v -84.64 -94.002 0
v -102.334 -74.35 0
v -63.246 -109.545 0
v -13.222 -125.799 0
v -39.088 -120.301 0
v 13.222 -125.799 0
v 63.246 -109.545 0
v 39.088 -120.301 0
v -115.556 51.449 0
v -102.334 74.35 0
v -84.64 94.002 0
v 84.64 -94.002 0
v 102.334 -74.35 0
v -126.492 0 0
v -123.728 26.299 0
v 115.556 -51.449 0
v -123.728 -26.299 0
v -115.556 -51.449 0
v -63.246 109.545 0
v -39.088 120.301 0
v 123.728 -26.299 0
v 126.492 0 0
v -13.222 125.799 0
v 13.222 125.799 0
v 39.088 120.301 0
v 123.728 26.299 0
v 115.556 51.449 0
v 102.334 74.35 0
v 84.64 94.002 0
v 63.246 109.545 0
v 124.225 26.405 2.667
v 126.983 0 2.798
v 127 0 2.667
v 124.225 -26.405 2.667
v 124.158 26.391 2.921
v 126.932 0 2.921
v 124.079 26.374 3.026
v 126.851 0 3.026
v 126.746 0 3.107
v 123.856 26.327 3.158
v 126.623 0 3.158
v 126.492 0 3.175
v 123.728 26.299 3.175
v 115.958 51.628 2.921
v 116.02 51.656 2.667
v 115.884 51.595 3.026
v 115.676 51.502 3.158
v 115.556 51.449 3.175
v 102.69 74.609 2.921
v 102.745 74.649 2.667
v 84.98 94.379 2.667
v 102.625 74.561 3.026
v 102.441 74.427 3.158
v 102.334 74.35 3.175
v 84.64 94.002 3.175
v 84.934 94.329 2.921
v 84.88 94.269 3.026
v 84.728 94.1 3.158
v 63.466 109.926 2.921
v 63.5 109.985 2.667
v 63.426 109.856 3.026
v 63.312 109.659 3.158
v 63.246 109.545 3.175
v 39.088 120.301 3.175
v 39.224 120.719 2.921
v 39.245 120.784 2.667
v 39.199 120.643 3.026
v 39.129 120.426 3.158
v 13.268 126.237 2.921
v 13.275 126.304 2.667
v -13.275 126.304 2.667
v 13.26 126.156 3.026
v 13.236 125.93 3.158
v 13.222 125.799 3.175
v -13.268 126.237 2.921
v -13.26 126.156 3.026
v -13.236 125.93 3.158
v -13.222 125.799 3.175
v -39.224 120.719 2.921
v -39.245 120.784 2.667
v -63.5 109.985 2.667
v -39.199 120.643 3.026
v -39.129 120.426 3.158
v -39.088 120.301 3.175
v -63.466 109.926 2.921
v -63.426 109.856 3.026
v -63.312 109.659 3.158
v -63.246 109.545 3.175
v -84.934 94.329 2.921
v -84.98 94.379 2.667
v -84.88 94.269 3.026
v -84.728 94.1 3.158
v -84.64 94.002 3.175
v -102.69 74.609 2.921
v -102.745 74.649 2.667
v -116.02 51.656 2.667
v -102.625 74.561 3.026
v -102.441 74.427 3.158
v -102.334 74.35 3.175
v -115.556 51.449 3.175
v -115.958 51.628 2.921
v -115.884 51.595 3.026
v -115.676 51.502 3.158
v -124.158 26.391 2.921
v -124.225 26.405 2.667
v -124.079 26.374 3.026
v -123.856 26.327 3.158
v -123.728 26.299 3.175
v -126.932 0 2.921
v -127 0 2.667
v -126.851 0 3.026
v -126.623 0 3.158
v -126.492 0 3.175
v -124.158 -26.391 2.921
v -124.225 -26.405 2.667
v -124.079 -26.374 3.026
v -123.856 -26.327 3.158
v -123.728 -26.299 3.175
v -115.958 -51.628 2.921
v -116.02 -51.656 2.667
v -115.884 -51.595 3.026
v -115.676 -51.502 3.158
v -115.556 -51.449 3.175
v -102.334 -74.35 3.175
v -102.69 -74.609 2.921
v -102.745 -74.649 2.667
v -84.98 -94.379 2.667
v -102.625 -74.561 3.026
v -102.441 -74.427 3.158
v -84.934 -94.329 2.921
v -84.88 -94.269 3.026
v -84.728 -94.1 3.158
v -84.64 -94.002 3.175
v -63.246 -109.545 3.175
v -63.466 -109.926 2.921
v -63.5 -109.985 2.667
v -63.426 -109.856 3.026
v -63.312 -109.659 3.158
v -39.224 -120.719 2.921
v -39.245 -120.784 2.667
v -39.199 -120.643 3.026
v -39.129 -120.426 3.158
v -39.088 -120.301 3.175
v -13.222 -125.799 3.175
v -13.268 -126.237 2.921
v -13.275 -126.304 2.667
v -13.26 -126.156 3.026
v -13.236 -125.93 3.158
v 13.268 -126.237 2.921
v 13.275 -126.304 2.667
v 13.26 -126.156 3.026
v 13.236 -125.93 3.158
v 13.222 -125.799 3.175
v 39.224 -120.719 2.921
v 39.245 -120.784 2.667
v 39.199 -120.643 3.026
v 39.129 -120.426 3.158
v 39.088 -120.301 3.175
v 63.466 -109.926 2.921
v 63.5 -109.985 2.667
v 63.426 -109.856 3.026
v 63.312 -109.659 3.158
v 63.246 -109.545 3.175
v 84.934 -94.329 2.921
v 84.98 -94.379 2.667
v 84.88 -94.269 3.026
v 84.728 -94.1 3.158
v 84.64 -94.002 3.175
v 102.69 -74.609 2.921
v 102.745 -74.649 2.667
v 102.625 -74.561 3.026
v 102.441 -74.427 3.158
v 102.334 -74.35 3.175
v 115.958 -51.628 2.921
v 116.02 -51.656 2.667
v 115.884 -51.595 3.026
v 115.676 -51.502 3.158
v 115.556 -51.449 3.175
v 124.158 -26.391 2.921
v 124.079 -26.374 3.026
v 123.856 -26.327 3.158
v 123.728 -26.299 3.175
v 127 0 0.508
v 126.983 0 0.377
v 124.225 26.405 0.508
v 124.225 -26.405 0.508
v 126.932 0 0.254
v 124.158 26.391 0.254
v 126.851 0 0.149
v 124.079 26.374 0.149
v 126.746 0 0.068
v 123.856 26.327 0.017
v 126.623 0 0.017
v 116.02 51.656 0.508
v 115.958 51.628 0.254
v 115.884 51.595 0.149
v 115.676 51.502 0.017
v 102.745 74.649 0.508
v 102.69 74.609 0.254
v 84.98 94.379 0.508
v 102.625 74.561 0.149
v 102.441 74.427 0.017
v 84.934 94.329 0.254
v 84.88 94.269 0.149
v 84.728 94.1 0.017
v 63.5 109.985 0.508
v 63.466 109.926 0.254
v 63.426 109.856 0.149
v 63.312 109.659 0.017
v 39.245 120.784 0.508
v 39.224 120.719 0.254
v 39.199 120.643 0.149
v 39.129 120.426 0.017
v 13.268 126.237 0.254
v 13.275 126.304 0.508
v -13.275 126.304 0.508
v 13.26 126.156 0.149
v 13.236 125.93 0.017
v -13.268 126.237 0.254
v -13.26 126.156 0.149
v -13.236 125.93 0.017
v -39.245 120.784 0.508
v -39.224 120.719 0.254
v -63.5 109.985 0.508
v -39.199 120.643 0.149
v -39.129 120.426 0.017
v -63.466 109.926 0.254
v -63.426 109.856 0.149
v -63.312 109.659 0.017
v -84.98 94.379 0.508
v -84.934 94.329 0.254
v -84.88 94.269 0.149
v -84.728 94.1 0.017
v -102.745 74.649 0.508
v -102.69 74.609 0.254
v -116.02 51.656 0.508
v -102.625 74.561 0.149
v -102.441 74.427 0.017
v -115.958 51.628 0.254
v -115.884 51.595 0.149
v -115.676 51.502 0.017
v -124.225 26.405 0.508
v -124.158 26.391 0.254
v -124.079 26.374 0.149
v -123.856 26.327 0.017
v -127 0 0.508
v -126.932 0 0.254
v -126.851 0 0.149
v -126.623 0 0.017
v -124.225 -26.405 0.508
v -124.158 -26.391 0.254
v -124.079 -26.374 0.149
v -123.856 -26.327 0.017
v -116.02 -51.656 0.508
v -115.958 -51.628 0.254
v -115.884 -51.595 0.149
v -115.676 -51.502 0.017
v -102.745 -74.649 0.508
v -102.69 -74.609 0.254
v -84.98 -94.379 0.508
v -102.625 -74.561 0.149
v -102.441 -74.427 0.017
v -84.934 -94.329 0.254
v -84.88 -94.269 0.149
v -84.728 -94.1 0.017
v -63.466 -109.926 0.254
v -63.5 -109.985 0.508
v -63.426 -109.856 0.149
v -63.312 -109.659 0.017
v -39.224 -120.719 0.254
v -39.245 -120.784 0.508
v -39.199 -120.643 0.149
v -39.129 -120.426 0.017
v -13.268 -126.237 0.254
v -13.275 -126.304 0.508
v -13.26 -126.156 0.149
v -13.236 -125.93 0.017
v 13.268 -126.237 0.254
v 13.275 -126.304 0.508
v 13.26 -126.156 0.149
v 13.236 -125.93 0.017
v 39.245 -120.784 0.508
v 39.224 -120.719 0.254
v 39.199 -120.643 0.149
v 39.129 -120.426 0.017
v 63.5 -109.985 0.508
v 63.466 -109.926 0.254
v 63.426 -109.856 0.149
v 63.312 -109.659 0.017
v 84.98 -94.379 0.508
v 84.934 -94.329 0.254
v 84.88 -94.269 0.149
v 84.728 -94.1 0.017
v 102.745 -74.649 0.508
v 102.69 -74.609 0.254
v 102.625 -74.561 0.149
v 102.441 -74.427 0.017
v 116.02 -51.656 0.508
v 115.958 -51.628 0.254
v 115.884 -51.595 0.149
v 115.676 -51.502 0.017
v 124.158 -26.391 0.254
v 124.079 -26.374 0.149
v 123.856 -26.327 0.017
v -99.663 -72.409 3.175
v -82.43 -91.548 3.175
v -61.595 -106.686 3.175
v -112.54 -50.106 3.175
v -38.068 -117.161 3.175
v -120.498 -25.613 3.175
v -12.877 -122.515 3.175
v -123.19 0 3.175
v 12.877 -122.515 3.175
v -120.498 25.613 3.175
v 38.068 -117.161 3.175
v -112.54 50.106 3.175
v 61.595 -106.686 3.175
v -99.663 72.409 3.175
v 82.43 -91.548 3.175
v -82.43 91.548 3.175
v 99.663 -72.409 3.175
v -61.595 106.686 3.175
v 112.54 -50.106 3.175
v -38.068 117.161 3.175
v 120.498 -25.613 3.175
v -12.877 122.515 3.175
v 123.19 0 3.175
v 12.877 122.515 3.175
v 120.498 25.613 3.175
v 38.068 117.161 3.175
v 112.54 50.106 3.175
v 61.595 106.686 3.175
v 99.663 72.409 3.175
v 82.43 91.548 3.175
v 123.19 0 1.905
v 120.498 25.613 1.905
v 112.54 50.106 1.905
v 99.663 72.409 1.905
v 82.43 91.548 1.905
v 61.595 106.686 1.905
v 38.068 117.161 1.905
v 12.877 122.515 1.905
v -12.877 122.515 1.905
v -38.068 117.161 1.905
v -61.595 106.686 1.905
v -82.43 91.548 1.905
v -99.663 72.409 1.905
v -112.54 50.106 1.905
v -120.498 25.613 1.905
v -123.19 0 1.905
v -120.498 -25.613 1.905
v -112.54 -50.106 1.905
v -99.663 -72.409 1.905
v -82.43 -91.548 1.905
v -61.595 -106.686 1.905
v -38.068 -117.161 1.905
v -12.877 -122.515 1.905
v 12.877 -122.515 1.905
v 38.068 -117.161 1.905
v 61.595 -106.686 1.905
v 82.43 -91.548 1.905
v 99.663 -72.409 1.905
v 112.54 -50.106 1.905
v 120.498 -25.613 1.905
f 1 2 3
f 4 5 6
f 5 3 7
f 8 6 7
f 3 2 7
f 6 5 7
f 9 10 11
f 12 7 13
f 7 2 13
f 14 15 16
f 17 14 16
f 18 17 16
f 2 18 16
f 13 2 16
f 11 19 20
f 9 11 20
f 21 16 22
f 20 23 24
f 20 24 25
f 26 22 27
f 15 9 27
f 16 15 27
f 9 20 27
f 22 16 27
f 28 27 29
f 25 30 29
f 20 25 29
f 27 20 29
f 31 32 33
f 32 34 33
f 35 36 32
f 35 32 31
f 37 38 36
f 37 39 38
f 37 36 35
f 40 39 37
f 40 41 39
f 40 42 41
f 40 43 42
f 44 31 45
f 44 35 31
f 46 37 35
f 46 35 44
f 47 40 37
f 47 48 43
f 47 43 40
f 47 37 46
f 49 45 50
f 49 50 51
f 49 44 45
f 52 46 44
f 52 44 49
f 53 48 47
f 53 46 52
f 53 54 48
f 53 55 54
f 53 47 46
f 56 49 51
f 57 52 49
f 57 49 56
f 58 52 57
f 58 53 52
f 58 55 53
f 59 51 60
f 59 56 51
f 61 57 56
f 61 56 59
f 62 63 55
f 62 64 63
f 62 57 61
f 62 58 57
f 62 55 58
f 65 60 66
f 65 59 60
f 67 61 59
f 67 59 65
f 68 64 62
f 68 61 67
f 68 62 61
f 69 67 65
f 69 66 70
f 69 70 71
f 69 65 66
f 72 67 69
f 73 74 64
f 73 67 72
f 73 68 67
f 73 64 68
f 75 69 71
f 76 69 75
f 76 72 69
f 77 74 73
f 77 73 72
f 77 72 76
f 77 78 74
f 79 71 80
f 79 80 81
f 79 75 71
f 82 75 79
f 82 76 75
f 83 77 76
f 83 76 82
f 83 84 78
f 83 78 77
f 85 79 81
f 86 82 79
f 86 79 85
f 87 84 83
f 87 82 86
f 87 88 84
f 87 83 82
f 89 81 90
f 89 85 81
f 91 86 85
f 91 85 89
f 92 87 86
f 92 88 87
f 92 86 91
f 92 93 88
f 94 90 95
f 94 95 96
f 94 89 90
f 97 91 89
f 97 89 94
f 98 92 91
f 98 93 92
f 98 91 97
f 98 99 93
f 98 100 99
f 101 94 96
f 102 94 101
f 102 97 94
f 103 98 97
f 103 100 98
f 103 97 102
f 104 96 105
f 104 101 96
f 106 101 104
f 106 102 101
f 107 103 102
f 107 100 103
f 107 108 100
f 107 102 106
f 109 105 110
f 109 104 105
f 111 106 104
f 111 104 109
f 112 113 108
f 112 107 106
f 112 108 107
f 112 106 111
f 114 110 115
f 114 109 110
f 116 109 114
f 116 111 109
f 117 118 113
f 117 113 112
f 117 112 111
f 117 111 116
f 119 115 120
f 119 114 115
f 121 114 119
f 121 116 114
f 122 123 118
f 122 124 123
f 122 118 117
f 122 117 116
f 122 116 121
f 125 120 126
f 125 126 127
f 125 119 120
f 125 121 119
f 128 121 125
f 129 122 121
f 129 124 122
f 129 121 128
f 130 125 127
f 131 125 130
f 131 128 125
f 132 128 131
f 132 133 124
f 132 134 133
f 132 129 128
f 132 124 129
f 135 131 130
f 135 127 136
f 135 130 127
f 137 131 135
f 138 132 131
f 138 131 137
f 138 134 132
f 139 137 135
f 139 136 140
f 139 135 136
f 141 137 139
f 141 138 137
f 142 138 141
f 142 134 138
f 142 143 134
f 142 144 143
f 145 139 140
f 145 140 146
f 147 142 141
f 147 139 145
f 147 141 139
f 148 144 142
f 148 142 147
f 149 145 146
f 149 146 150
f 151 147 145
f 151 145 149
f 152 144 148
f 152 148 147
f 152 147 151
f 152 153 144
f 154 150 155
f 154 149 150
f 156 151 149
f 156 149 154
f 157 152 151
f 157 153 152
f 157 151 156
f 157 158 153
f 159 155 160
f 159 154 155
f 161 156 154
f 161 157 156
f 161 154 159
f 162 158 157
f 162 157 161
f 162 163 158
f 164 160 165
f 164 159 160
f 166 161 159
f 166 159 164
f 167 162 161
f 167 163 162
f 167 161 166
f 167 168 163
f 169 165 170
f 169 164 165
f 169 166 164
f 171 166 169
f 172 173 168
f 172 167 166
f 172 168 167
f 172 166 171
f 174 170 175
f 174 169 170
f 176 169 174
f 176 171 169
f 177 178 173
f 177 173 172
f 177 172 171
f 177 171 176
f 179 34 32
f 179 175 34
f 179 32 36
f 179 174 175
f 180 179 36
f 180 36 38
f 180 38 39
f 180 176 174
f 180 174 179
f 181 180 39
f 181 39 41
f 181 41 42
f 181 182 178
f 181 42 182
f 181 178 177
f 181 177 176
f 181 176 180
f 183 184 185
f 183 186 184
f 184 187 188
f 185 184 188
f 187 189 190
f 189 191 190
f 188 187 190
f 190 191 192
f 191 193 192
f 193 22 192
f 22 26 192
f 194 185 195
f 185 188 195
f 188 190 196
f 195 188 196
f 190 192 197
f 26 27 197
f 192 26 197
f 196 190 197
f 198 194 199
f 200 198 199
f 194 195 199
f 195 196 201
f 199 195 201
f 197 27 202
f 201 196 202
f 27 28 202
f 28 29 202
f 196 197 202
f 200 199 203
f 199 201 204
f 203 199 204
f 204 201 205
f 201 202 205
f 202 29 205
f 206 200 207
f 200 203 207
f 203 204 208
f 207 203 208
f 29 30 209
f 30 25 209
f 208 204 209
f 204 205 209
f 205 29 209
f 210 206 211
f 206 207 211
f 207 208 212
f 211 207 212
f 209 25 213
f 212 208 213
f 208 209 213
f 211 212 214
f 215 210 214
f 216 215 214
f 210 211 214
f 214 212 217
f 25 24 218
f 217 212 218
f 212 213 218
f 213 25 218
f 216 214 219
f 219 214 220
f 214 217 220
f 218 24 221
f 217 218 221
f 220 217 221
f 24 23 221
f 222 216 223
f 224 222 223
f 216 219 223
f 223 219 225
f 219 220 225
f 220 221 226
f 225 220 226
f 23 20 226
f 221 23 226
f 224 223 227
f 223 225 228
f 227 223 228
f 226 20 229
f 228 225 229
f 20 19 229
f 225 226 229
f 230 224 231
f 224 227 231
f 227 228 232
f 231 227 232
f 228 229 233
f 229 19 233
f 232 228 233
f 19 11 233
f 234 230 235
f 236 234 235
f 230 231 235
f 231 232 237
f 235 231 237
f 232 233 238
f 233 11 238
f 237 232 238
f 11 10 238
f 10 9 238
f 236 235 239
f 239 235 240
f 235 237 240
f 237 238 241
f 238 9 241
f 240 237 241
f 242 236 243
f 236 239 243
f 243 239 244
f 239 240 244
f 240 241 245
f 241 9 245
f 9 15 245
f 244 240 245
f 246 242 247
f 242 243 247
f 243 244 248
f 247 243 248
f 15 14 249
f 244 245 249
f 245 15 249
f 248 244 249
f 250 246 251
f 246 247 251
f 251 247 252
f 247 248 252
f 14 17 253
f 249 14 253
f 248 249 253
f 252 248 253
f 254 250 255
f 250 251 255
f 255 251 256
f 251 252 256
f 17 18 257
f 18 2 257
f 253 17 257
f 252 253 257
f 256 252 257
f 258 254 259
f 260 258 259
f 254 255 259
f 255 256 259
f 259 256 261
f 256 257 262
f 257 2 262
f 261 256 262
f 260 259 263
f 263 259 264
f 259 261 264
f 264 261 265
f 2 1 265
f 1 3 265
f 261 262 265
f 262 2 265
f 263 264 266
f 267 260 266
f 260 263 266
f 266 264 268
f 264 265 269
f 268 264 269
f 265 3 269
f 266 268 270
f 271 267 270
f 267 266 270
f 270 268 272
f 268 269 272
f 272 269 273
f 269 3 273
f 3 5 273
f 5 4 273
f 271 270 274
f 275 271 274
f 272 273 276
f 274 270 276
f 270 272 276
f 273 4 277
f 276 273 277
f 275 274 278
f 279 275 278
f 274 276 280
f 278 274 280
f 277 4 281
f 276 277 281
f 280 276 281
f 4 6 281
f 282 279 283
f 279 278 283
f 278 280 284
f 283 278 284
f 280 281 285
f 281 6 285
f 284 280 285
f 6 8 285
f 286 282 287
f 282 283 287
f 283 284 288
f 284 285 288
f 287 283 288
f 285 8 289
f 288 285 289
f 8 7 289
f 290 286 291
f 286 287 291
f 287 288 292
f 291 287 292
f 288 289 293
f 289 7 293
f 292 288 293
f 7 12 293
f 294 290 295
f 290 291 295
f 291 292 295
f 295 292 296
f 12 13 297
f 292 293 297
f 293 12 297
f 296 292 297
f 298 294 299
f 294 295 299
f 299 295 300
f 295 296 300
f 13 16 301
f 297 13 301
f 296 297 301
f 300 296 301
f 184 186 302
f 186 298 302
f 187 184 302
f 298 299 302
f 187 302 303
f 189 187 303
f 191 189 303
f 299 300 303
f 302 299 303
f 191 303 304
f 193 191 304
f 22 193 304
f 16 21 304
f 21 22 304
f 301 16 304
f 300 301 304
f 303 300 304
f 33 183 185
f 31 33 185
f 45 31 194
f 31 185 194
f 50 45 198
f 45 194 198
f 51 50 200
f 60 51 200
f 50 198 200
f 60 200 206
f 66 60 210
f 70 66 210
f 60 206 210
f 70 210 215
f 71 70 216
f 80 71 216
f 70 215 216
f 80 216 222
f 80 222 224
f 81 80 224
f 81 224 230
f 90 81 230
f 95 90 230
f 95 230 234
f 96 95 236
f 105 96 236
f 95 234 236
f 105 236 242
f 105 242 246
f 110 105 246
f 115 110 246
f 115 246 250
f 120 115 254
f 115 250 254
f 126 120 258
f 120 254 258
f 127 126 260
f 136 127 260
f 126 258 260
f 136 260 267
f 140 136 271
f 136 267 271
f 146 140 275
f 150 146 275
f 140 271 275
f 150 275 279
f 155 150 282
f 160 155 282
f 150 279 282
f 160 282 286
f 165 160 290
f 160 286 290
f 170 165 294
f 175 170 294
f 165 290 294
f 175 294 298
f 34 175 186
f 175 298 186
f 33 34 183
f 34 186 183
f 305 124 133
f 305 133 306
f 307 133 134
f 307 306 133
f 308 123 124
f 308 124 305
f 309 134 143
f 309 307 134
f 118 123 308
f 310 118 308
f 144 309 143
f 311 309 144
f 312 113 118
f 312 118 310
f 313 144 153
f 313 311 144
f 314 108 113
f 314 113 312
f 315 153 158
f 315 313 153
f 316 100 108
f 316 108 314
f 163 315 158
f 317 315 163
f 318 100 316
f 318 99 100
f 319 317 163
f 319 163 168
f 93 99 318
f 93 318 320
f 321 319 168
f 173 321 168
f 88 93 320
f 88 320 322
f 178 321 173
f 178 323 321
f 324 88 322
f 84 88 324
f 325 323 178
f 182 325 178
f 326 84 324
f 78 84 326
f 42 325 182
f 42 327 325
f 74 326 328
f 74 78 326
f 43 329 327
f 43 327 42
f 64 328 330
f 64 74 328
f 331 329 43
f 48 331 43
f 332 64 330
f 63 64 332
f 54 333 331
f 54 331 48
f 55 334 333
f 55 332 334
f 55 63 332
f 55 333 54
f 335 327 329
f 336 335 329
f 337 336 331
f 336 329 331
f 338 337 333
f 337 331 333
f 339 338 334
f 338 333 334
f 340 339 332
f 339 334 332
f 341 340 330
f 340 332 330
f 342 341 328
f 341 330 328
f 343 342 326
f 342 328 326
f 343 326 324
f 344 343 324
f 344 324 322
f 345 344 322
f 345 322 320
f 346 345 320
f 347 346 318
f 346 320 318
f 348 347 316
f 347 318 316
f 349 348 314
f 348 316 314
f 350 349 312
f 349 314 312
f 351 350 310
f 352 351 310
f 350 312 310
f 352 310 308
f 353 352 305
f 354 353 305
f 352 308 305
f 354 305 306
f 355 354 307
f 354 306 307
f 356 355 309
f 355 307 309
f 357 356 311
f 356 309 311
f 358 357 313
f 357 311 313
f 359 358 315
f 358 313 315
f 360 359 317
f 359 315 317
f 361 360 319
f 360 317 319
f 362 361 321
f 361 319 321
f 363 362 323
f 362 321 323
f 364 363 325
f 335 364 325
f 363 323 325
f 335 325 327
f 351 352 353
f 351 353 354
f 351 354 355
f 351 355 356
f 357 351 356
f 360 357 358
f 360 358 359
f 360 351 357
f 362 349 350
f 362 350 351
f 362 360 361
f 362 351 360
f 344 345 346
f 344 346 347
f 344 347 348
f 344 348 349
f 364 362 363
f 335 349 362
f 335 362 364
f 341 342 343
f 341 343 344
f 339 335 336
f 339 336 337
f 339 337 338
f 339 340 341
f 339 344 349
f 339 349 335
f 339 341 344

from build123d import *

# Parameters (mm, degrees)
F0_R     = 127
F1_DEPTH = 3.175
F2_R     = 0.508
F3_R     = 123.19
F4_DEPTH = 1.27


with BuildPart() as f1:
    # F0 (on Top) → F1 (new body)
    with BuildSketch(Plane.XY):
        Circle(F0_R)
    extrude(amount=F1_DEPTH)

    # F2
    f2_edges = [f1.edges().sort_by_distance(p)[0] for p in [
        (-127, 0, 0),
        (-127, 0, 3.175),
    ]]
    fillet(f2_edges, radius=F2_R)

    # F3 (on face) → F4 (cut)
    with BuildSketch(Plane.XY.offset(3.175)):
        Circle(F3_R)
    extrude(amount=-F4_DEPTH, mode=Mode.SUBTRACT)


solid = f1.part
